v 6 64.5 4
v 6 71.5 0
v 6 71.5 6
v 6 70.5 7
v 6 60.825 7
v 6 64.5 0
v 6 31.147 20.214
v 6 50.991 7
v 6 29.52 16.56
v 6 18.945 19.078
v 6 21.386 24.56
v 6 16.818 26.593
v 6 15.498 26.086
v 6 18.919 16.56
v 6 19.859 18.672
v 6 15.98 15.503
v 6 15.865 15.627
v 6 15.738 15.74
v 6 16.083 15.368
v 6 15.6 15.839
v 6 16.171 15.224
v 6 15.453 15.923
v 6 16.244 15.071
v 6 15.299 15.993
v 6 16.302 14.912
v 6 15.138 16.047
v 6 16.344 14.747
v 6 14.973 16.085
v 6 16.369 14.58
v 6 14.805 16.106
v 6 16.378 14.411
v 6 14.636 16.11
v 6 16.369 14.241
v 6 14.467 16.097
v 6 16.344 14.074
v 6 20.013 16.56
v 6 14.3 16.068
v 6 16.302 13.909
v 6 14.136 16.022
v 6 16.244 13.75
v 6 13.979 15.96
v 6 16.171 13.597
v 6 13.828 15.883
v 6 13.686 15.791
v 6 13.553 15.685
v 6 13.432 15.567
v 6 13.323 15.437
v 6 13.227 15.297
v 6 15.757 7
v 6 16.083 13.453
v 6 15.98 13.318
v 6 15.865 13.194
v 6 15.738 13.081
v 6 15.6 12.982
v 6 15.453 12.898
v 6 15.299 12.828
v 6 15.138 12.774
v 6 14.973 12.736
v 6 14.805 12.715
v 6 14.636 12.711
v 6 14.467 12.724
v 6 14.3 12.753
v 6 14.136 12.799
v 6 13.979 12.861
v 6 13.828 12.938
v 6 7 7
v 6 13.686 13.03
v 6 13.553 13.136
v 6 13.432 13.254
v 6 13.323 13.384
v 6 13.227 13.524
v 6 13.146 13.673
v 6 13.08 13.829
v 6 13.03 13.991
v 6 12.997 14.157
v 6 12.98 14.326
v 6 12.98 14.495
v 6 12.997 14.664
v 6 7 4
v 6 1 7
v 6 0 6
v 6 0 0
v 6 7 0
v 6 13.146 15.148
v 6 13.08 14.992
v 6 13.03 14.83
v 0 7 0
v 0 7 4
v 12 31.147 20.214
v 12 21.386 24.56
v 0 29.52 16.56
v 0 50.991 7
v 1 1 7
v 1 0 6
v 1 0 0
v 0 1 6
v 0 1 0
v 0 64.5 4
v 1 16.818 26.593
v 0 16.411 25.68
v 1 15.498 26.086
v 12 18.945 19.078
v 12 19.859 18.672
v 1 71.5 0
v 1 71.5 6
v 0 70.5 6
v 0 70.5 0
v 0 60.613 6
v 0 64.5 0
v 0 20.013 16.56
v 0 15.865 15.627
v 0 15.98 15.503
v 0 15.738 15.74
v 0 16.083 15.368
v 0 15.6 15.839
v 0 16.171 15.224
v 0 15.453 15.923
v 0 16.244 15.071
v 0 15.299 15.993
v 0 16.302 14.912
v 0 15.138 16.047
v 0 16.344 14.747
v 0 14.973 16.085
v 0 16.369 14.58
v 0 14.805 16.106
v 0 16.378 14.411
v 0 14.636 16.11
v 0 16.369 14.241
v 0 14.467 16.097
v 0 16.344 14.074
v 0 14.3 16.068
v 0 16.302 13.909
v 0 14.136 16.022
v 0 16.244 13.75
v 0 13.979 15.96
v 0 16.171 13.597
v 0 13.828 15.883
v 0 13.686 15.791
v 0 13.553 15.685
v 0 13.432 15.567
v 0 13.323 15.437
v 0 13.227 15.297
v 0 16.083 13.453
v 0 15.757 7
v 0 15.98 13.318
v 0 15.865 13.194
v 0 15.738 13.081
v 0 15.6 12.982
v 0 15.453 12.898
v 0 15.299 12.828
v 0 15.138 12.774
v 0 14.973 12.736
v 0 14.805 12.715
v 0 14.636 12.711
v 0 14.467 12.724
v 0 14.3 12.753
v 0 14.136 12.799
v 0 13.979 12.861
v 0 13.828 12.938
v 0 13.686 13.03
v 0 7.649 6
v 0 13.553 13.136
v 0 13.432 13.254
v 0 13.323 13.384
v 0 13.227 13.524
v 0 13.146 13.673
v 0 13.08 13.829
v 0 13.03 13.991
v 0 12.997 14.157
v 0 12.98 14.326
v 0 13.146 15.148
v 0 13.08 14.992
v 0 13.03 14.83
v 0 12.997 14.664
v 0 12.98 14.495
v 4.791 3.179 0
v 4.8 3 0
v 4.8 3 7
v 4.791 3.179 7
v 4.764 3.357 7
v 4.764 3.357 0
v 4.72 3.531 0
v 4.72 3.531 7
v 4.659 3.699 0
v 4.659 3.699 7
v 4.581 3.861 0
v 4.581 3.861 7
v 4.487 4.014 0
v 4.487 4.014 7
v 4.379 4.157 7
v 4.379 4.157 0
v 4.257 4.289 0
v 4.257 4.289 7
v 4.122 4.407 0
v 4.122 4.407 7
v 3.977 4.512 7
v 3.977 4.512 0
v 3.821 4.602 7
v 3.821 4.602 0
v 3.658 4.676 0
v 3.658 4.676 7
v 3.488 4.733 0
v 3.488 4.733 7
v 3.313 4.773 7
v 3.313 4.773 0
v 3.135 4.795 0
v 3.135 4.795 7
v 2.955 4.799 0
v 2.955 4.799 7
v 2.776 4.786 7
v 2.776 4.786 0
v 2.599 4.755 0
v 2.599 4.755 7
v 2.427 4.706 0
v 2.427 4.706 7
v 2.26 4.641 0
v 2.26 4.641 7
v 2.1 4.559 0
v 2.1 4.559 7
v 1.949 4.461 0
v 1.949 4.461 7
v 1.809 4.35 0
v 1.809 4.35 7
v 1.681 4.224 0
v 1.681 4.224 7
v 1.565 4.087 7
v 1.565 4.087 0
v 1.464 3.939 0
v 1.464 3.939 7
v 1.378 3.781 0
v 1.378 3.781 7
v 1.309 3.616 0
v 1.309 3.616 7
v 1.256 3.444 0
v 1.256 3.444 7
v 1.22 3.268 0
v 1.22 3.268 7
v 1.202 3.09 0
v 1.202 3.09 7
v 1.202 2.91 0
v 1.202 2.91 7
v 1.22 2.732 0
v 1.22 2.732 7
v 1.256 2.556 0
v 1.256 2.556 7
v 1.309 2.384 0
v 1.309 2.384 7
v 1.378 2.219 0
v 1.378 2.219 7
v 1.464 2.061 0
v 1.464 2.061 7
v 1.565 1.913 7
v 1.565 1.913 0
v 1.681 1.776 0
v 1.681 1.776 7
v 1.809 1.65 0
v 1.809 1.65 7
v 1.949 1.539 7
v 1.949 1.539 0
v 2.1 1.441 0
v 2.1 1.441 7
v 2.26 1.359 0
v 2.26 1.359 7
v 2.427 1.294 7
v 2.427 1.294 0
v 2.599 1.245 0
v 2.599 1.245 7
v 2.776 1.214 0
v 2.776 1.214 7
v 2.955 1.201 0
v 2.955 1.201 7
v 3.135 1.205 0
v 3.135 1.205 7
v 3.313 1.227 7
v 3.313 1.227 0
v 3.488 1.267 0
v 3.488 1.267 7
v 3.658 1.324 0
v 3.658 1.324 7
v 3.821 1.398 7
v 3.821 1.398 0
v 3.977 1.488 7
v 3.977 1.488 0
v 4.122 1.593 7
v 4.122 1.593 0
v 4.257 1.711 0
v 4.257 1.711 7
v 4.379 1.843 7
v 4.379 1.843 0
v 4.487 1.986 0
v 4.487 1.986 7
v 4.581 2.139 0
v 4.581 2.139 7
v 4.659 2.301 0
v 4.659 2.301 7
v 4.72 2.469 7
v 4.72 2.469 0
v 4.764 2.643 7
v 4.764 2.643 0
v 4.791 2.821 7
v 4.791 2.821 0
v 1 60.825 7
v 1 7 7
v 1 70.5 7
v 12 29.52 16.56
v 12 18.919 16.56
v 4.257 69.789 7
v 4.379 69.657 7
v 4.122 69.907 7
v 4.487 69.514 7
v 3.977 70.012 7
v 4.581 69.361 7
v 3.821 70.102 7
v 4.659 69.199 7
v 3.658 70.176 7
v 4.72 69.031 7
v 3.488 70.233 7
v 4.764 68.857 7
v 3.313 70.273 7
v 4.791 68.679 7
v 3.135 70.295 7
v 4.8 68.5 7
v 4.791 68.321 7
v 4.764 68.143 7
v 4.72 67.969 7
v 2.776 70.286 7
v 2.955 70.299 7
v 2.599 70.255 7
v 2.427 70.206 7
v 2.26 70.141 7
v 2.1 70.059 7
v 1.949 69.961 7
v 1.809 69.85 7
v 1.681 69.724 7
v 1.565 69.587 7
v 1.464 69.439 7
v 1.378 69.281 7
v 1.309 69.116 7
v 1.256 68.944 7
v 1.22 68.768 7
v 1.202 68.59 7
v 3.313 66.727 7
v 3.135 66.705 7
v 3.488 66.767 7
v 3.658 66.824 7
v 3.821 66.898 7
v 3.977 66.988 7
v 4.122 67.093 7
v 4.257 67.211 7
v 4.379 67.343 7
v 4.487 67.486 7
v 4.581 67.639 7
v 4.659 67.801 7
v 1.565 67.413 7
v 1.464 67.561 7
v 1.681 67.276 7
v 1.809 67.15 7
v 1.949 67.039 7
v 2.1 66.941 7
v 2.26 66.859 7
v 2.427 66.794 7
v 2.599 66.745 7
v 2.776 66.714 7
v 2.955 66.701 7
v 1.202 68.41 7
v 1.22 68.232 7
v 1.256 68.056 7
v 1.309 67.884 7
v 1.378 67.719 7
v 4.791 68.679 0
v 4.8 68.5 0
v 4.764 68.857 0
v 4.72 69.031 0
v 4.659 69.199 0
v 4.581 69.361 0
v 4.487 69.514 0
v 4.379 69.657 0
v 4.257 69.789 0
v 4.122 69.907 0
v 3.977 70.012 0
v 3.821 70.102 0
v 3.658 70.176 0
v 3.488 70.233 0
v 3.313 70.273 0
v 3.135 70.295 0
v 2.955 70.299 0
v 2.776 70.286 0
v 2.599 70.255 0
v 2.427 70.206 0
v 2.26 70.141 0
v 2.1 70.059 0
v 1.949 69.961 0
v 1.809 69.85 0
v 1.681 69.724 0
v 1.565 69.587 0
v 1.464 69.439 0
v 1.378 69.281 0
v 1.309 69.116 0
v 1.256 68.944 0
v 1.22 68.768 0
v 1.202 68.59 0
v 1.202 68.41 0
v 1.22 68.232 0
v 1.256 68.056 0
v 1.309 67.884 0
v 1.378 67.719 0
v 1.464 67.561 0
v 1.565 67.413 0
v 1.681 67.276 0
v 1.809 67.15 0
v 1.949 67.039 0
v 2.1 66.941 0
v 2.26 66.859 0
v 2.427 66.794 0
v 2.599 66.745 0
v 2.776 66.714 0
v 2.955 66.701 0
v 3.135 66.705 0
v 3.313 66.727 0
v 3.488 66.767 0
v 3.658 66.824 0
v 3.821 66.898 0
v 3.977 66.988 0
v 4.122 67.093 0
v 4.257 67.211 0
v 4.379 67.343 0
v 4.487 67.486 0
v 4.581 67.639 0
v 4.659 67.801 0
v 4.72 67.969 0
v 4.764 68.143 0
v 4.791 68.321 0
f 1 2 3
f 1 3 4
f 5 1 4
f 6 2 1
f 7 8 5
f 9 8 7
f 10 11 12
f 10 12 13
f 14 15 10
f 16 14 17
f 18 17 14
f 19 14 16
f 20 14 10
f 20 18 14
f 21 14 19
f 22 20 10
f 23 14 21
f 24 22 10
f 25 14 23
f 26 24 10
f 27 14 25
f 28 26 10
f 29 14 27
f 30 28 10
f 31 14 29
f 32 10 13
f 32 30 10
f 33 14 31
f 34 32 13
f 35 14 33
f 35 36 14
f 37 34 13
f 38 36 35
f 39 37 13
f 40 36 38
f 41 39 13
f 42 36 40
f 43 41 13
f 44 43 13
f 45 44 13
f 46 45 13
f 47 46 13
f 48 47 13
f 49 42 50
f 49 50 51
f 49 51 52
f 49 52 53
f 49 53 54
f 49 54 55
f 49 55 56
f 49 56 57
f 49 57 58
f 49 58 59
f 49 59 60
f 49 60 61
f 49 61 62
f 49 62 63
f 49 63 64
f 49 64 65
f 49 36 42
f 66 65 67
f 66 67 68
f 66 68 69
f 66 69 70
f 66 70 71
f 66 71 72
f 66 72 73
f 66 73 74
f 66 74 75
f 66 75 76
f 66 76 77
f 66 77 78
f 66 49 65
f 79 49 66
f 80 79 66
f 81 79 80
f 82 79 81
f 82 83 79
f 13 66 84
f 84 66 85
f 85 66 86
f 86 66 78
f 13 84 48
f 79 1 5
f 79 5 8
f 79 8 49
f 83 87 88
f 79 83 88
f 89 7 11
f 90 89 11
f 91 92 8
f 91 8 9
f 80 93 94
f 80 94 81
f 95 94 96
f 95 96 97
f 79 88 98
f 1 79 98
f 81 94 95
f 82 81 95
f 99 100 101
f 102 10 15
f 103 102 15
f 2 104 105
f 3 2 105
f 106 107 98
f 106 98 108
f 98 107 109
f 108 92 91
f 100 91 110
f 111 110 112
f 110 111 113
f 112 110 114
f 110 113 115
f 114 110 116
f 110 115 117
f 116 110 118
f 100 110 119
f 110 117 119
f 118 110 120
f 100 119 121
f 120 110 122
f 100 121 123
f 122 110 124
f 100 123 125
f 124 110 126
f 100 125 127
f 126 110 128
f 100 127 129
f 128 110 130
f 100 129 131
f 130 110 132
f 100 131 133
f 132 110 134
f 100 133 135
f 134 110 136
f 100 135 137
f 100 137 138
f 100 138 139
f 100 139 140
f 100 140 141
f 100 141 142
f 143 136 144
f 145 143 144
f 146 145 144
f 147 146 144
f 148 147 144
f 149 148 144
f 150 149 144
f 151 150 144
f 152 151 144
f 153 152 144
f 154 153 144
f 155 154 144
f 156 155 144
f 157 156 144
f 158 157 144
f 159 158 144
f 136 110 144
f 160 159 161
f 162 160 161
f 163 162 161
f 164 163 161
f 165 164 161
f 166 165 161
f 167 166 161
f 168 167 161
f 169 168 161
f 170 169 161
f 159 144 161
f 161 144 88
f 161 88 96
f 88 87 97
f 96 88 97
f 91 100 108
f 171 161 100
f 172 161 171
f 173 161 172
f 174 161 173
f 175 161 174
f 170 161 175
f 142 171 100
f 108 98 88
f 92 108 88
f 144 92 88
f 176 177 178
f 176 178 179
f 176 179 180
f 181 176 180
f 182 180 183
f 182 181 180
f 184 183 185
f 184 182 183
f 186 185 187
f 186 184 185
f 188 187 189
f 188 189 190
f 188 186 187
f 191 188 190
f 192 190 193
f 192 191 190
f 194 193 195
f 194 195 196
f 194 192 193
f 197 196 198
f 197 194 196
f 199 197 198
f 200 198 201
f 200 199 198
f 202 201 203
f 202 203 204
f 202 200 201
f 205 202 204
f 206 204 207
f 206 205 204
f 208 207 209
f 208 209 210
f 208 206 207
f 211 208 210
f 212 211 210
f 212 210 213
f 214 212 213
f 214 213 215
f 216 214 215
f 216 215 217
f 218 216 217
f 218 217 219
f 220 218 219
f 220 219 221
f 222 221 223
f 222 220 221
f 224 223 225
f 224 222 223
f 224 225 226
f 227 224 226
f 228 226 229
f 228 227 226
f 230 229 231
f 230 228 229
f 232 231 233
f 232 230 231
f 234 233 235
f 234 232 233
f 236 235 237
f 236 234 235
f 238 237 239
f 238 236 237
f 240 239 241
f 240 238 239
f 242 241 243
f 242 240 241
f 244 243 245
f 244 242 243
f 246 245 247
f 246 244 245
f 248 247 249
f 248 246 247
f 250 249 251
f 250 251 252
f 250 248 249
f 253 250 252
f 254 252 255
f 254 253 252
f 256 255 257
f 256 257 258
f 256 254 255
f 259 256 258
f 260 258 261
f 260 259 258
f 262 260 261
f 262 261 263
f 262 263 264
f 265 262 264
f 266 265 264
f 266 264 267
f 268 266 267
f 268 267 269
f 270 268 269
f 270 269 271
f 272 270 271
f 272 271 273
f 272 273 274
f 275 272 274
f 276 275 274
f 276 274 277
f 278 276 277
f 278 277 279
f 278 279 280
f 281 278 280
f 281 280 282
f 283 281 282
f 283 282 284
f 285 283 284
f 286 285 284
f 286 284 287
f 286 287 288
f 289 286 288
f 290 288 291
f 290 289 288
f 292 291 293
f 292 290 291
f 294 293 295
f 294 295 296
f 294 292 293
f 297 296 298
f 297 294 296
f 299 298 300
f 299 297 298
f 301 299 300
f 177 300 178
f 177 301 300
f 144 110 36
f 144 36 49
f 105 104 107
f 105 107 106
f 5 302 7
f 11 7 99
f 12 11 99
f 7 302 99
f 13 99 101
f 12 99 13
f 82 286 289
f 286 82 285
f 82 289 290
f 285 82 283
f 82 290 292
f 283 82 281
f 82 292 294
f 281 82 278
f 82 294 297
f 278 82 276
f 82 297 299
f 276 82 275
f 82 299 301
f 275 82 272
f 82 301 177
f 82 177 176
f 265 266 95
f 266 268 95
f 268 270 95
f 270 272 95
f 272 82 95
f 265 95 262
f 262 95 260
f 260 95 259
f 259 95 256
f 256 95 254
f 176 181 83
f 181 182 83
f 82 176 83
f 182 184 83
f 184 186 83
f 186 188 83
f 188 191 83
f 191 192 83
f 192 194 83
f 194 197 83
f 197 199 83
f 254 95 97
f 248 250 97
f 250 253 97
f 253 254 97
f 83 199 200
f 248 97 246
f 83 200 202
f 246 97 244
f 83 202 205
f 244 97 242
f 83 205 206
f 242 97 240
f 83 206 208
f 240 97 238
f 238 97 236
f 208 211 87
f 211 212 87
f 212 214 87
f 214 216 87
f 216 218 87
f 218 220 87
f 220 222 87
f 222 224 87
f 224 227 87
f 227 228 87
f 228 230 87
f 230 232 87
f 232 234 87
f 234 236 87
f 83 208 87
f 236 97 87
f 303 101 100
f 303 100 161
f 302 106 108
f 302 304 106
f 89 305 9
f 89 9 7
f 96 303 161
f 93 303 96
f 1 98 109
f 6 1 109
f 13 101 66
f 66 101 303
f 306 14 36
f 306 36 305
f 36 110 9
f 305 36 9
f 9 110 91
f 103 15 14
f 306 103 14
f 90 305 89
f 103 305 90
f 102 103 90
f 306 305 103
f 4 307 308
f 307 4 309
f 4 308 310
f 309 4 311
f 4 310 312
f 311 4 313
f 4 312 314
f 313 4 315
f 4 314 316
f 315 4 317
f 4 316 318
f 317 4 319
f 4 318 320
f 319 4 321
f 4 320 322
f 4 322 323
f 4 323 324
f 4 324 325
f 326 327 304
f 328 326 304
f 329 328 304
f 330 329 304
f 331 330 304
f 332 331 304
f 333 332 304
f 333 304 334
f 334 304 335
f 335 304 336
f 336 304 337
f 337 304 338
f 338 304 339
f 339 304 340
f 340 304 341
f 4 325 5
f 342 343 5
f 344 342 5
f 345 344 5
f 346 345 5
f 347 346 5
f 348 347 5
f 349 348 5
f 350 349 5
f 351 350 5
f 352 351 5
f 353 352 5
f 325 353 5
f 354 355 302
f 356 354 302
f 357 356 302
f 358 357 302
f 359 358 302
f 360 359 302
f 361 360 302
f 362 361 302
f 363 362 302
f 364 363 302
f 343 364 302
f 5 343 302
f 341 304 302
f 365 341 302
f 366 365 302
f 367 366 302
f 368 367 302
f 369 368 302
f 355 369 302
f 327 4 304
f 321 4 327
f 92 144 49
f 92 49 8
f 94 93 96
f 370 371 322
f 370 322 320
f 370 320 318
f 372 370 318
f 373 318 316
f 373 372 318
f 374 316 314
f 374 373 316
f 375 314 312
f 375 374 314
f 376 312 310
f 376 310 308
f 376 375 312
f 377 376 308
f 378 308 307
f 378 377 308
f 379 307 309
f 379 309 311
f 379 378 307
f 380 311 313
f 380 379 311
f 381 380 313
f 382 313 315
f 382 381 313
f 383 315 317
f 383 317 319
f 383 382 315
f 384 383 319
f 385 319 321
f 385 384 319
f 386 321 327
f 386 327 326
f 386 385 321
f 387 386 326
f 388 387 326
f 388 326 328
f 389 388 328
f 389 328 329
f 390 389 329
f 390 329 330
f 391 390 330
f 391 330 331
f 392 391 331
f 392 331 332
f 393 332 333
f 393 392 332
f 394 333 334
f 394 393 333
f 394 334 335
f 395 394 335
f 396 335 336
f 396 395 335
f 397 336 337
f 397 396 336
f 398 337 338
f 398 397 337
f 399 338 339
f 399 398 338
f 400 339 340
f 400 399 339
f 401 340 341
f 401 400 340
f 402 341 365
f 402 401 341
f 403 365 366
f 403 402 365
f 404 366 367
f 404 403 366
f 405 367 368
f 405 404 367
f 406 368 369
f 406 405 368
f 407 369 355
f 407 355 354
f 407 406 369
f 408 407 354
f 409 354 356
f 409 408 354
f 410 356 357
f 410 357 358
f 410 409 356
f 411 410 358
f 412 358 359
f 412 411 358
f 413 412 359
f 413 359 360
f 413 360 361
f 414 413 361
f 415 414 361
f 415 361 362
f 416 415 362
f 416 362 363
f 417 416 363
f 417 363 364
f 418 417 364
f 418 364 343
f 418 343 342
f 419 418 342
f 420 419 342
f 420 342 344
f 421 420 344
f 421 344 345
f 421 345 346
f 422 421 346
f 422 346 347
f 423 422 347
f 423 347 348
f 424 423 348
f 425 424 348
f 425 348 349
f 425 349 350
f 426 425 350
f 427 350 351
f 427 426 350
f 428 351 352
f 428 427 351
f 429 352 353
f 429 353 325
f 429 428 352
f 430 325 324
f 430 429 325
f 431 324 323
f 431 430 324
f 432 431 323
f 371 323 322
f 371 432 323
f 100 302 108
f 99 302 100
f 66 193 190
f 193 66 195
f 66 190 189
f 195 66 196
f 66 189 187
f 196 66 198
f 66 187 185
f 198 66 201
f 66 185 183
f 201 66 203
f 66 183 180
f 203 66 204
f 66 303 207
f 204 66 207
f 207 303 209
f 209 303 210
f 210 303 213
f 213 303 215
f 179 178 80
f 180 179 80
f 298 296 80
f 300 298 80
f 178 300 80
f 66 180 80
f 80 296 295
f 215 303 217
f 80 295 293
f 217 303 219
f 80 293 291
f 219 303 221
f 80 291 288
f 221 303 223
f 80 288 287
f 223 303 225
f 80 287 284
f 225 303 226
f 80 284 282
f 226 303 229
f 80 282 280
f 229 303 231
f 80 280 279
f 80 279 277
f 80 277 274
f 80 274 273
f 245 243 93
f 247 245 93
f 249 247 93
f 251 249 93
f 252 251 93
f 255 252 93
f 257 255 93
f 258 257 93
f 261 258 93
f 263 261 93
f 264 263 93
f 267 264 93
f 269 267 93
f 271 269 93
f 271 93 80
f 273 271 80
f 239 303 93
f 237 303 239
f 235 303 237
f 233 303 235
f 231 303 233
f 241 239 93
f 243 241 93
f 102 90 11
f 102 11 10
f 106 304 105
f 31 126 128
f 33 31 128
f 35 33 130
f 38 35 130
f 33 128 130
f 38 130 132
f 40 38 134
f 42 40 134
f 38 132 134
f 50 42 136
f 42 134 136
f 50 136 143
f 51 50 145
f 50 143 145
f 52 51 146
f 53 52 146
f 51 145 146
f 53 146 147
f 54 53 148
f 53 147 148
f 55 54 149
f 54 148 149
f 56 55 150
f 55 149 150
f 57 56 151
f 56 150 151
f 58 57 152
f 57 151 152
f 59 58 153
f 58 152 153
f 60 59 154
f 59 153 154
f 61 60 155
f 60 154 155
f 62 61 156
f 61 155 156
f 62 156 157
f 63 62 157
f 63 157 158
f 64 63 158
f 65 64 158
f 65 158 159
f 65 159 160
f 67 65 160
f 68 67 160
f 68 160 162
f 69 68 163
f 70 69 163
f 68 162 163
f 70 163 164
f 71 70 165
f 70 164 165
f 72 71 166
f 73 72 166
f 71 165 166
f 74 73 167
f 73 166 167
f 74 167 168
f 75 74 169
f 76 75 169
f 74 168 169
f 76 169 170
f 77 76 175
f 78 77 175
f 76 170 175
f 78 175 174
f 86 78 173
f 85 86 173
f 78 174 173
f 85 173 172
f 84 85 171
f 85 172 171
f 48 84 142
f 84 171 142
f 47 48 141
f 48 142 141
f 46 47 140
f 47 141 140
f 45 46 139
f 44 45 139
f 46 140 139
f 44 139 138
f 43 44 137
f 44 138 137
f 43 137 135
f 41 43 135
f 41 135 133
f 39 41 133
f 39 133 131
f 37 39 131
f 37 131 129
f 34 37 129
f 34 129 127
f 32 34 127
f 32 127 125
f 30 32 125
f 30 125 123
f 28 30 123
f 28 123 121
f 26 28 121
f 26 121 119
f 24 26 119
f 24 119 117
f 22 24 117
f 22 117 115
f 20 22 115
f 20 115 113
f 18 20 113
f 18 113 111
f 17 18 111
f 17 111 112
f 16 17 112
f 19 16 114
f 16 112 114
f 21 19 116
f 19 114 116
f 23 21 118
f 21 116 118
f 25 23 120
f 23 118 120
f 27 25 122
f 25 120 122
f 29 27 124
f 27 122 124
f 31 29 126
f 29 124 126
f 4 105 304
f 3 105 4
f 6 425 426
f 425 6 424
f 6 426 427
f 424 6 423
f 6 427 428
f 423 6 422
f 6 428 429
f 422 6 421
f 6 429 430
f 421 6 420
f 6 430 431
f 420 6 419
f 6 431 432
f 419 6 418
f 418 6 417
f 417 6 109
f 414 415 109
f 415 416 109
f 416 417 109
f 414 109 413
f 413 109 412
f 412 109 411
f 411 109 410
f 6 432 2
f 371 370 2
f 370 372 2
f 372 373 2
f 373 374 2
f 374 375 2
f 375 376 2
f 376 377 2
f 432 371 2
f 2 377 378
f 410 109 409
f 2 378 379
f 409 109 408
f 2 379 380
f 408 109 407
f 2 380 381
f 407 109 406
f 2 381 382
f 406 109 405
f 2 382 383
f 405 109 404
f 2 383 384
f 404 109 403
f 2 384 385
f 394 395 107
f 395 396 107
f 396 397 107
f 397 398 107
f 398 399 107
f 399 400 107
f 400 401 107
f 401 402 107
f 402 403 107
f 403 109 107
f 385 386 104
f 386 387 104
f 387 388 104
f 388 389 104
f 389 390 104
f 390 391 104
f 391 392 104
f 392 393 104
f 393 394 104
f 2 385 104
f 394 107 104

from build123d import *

# Parameters (mm, degrees)
SKETCH006_R     = 1.7
PAD003_DEPTH    = 6
SKETCH007_R     = 1.8
POCKET003_DEPTH = 7
PAD004_DEPTH    = 12
CHAMFER002_SIZE = 1


with BuildPart() as support:
    # Sketch006 → Pad003 (new body)
    with BuildSketch(Plane.YZ):
        Polygon((71.5, 0), (71.5, -7), (60.825309, -7), (15.904574, -27), (7, -7), (0, -7), (0, 0), (7, 0), (7, -4), (64.5, -4), (64.5, 0), align=None)
        with Locations((14.677916, -14.410508)):
            Circle(SKETCH006_R, mode=Mode.SUBTRACT)
        Polygon((15.75709, -7), (50.990936, -7), (21.585991, -20.091925), align=None, mode=Mode.SUBTRACT)
    extrude(amount=PAD003_DEPTH)

    # Sketch007 → Pocket003 (cut)
    with BuildSketch(Plane.XY):
        with Locations((3, 68.5)):
            Circle(SKETCH007_R)
        with Locations((3, 3)):
            Circle(SKETCH007_R)
    extrude(amount=-POCKET003_DEPTH, mode=Mode.SUBTRACT)

    # Sketch008 → Pad004 (join)
    with BuildSketch(Plane.YZ):
        Polygon((21.385846, -24.55958), (18.945427, -19.078307), (19.858972, -18.671571), (18.918653, -16.55958), (29.519767, -16.55958), (31.146714, -20.213762), align=None)
    extrude(amount=PAD004_DEPTH)

    # Chamfer002
    chamfer002_edges = [support.edges().sort_by_distance(p)[0] for p in [
        (0, 66.162655, -7),
        (0, 45.986012, -13.606881),
        (0, 26.26628, -22.386671),
        (0, 18.64521, -25.77979),
        (0, 11.452287, -17),
        (0, 3.5, -7),
        (3, 0, -7),
        (3, 15.904574, -27),
        (3, 71.5, -7),
        (0, 0, -3.5),
        (0, 71.5, -3.5),
    ]]
    chamfer(chamfer002_edges, length=CHAMFER002_SIZE)


with BuildPart() as support_mirror:
    # Part__Mirroring: instance of support
    add(support.part.mirror(Plane(origin=(0, 0, 0), x_dir=(0, 1, 0), z_dir=(0, 0, 1))))


solid = support_mirror.part
